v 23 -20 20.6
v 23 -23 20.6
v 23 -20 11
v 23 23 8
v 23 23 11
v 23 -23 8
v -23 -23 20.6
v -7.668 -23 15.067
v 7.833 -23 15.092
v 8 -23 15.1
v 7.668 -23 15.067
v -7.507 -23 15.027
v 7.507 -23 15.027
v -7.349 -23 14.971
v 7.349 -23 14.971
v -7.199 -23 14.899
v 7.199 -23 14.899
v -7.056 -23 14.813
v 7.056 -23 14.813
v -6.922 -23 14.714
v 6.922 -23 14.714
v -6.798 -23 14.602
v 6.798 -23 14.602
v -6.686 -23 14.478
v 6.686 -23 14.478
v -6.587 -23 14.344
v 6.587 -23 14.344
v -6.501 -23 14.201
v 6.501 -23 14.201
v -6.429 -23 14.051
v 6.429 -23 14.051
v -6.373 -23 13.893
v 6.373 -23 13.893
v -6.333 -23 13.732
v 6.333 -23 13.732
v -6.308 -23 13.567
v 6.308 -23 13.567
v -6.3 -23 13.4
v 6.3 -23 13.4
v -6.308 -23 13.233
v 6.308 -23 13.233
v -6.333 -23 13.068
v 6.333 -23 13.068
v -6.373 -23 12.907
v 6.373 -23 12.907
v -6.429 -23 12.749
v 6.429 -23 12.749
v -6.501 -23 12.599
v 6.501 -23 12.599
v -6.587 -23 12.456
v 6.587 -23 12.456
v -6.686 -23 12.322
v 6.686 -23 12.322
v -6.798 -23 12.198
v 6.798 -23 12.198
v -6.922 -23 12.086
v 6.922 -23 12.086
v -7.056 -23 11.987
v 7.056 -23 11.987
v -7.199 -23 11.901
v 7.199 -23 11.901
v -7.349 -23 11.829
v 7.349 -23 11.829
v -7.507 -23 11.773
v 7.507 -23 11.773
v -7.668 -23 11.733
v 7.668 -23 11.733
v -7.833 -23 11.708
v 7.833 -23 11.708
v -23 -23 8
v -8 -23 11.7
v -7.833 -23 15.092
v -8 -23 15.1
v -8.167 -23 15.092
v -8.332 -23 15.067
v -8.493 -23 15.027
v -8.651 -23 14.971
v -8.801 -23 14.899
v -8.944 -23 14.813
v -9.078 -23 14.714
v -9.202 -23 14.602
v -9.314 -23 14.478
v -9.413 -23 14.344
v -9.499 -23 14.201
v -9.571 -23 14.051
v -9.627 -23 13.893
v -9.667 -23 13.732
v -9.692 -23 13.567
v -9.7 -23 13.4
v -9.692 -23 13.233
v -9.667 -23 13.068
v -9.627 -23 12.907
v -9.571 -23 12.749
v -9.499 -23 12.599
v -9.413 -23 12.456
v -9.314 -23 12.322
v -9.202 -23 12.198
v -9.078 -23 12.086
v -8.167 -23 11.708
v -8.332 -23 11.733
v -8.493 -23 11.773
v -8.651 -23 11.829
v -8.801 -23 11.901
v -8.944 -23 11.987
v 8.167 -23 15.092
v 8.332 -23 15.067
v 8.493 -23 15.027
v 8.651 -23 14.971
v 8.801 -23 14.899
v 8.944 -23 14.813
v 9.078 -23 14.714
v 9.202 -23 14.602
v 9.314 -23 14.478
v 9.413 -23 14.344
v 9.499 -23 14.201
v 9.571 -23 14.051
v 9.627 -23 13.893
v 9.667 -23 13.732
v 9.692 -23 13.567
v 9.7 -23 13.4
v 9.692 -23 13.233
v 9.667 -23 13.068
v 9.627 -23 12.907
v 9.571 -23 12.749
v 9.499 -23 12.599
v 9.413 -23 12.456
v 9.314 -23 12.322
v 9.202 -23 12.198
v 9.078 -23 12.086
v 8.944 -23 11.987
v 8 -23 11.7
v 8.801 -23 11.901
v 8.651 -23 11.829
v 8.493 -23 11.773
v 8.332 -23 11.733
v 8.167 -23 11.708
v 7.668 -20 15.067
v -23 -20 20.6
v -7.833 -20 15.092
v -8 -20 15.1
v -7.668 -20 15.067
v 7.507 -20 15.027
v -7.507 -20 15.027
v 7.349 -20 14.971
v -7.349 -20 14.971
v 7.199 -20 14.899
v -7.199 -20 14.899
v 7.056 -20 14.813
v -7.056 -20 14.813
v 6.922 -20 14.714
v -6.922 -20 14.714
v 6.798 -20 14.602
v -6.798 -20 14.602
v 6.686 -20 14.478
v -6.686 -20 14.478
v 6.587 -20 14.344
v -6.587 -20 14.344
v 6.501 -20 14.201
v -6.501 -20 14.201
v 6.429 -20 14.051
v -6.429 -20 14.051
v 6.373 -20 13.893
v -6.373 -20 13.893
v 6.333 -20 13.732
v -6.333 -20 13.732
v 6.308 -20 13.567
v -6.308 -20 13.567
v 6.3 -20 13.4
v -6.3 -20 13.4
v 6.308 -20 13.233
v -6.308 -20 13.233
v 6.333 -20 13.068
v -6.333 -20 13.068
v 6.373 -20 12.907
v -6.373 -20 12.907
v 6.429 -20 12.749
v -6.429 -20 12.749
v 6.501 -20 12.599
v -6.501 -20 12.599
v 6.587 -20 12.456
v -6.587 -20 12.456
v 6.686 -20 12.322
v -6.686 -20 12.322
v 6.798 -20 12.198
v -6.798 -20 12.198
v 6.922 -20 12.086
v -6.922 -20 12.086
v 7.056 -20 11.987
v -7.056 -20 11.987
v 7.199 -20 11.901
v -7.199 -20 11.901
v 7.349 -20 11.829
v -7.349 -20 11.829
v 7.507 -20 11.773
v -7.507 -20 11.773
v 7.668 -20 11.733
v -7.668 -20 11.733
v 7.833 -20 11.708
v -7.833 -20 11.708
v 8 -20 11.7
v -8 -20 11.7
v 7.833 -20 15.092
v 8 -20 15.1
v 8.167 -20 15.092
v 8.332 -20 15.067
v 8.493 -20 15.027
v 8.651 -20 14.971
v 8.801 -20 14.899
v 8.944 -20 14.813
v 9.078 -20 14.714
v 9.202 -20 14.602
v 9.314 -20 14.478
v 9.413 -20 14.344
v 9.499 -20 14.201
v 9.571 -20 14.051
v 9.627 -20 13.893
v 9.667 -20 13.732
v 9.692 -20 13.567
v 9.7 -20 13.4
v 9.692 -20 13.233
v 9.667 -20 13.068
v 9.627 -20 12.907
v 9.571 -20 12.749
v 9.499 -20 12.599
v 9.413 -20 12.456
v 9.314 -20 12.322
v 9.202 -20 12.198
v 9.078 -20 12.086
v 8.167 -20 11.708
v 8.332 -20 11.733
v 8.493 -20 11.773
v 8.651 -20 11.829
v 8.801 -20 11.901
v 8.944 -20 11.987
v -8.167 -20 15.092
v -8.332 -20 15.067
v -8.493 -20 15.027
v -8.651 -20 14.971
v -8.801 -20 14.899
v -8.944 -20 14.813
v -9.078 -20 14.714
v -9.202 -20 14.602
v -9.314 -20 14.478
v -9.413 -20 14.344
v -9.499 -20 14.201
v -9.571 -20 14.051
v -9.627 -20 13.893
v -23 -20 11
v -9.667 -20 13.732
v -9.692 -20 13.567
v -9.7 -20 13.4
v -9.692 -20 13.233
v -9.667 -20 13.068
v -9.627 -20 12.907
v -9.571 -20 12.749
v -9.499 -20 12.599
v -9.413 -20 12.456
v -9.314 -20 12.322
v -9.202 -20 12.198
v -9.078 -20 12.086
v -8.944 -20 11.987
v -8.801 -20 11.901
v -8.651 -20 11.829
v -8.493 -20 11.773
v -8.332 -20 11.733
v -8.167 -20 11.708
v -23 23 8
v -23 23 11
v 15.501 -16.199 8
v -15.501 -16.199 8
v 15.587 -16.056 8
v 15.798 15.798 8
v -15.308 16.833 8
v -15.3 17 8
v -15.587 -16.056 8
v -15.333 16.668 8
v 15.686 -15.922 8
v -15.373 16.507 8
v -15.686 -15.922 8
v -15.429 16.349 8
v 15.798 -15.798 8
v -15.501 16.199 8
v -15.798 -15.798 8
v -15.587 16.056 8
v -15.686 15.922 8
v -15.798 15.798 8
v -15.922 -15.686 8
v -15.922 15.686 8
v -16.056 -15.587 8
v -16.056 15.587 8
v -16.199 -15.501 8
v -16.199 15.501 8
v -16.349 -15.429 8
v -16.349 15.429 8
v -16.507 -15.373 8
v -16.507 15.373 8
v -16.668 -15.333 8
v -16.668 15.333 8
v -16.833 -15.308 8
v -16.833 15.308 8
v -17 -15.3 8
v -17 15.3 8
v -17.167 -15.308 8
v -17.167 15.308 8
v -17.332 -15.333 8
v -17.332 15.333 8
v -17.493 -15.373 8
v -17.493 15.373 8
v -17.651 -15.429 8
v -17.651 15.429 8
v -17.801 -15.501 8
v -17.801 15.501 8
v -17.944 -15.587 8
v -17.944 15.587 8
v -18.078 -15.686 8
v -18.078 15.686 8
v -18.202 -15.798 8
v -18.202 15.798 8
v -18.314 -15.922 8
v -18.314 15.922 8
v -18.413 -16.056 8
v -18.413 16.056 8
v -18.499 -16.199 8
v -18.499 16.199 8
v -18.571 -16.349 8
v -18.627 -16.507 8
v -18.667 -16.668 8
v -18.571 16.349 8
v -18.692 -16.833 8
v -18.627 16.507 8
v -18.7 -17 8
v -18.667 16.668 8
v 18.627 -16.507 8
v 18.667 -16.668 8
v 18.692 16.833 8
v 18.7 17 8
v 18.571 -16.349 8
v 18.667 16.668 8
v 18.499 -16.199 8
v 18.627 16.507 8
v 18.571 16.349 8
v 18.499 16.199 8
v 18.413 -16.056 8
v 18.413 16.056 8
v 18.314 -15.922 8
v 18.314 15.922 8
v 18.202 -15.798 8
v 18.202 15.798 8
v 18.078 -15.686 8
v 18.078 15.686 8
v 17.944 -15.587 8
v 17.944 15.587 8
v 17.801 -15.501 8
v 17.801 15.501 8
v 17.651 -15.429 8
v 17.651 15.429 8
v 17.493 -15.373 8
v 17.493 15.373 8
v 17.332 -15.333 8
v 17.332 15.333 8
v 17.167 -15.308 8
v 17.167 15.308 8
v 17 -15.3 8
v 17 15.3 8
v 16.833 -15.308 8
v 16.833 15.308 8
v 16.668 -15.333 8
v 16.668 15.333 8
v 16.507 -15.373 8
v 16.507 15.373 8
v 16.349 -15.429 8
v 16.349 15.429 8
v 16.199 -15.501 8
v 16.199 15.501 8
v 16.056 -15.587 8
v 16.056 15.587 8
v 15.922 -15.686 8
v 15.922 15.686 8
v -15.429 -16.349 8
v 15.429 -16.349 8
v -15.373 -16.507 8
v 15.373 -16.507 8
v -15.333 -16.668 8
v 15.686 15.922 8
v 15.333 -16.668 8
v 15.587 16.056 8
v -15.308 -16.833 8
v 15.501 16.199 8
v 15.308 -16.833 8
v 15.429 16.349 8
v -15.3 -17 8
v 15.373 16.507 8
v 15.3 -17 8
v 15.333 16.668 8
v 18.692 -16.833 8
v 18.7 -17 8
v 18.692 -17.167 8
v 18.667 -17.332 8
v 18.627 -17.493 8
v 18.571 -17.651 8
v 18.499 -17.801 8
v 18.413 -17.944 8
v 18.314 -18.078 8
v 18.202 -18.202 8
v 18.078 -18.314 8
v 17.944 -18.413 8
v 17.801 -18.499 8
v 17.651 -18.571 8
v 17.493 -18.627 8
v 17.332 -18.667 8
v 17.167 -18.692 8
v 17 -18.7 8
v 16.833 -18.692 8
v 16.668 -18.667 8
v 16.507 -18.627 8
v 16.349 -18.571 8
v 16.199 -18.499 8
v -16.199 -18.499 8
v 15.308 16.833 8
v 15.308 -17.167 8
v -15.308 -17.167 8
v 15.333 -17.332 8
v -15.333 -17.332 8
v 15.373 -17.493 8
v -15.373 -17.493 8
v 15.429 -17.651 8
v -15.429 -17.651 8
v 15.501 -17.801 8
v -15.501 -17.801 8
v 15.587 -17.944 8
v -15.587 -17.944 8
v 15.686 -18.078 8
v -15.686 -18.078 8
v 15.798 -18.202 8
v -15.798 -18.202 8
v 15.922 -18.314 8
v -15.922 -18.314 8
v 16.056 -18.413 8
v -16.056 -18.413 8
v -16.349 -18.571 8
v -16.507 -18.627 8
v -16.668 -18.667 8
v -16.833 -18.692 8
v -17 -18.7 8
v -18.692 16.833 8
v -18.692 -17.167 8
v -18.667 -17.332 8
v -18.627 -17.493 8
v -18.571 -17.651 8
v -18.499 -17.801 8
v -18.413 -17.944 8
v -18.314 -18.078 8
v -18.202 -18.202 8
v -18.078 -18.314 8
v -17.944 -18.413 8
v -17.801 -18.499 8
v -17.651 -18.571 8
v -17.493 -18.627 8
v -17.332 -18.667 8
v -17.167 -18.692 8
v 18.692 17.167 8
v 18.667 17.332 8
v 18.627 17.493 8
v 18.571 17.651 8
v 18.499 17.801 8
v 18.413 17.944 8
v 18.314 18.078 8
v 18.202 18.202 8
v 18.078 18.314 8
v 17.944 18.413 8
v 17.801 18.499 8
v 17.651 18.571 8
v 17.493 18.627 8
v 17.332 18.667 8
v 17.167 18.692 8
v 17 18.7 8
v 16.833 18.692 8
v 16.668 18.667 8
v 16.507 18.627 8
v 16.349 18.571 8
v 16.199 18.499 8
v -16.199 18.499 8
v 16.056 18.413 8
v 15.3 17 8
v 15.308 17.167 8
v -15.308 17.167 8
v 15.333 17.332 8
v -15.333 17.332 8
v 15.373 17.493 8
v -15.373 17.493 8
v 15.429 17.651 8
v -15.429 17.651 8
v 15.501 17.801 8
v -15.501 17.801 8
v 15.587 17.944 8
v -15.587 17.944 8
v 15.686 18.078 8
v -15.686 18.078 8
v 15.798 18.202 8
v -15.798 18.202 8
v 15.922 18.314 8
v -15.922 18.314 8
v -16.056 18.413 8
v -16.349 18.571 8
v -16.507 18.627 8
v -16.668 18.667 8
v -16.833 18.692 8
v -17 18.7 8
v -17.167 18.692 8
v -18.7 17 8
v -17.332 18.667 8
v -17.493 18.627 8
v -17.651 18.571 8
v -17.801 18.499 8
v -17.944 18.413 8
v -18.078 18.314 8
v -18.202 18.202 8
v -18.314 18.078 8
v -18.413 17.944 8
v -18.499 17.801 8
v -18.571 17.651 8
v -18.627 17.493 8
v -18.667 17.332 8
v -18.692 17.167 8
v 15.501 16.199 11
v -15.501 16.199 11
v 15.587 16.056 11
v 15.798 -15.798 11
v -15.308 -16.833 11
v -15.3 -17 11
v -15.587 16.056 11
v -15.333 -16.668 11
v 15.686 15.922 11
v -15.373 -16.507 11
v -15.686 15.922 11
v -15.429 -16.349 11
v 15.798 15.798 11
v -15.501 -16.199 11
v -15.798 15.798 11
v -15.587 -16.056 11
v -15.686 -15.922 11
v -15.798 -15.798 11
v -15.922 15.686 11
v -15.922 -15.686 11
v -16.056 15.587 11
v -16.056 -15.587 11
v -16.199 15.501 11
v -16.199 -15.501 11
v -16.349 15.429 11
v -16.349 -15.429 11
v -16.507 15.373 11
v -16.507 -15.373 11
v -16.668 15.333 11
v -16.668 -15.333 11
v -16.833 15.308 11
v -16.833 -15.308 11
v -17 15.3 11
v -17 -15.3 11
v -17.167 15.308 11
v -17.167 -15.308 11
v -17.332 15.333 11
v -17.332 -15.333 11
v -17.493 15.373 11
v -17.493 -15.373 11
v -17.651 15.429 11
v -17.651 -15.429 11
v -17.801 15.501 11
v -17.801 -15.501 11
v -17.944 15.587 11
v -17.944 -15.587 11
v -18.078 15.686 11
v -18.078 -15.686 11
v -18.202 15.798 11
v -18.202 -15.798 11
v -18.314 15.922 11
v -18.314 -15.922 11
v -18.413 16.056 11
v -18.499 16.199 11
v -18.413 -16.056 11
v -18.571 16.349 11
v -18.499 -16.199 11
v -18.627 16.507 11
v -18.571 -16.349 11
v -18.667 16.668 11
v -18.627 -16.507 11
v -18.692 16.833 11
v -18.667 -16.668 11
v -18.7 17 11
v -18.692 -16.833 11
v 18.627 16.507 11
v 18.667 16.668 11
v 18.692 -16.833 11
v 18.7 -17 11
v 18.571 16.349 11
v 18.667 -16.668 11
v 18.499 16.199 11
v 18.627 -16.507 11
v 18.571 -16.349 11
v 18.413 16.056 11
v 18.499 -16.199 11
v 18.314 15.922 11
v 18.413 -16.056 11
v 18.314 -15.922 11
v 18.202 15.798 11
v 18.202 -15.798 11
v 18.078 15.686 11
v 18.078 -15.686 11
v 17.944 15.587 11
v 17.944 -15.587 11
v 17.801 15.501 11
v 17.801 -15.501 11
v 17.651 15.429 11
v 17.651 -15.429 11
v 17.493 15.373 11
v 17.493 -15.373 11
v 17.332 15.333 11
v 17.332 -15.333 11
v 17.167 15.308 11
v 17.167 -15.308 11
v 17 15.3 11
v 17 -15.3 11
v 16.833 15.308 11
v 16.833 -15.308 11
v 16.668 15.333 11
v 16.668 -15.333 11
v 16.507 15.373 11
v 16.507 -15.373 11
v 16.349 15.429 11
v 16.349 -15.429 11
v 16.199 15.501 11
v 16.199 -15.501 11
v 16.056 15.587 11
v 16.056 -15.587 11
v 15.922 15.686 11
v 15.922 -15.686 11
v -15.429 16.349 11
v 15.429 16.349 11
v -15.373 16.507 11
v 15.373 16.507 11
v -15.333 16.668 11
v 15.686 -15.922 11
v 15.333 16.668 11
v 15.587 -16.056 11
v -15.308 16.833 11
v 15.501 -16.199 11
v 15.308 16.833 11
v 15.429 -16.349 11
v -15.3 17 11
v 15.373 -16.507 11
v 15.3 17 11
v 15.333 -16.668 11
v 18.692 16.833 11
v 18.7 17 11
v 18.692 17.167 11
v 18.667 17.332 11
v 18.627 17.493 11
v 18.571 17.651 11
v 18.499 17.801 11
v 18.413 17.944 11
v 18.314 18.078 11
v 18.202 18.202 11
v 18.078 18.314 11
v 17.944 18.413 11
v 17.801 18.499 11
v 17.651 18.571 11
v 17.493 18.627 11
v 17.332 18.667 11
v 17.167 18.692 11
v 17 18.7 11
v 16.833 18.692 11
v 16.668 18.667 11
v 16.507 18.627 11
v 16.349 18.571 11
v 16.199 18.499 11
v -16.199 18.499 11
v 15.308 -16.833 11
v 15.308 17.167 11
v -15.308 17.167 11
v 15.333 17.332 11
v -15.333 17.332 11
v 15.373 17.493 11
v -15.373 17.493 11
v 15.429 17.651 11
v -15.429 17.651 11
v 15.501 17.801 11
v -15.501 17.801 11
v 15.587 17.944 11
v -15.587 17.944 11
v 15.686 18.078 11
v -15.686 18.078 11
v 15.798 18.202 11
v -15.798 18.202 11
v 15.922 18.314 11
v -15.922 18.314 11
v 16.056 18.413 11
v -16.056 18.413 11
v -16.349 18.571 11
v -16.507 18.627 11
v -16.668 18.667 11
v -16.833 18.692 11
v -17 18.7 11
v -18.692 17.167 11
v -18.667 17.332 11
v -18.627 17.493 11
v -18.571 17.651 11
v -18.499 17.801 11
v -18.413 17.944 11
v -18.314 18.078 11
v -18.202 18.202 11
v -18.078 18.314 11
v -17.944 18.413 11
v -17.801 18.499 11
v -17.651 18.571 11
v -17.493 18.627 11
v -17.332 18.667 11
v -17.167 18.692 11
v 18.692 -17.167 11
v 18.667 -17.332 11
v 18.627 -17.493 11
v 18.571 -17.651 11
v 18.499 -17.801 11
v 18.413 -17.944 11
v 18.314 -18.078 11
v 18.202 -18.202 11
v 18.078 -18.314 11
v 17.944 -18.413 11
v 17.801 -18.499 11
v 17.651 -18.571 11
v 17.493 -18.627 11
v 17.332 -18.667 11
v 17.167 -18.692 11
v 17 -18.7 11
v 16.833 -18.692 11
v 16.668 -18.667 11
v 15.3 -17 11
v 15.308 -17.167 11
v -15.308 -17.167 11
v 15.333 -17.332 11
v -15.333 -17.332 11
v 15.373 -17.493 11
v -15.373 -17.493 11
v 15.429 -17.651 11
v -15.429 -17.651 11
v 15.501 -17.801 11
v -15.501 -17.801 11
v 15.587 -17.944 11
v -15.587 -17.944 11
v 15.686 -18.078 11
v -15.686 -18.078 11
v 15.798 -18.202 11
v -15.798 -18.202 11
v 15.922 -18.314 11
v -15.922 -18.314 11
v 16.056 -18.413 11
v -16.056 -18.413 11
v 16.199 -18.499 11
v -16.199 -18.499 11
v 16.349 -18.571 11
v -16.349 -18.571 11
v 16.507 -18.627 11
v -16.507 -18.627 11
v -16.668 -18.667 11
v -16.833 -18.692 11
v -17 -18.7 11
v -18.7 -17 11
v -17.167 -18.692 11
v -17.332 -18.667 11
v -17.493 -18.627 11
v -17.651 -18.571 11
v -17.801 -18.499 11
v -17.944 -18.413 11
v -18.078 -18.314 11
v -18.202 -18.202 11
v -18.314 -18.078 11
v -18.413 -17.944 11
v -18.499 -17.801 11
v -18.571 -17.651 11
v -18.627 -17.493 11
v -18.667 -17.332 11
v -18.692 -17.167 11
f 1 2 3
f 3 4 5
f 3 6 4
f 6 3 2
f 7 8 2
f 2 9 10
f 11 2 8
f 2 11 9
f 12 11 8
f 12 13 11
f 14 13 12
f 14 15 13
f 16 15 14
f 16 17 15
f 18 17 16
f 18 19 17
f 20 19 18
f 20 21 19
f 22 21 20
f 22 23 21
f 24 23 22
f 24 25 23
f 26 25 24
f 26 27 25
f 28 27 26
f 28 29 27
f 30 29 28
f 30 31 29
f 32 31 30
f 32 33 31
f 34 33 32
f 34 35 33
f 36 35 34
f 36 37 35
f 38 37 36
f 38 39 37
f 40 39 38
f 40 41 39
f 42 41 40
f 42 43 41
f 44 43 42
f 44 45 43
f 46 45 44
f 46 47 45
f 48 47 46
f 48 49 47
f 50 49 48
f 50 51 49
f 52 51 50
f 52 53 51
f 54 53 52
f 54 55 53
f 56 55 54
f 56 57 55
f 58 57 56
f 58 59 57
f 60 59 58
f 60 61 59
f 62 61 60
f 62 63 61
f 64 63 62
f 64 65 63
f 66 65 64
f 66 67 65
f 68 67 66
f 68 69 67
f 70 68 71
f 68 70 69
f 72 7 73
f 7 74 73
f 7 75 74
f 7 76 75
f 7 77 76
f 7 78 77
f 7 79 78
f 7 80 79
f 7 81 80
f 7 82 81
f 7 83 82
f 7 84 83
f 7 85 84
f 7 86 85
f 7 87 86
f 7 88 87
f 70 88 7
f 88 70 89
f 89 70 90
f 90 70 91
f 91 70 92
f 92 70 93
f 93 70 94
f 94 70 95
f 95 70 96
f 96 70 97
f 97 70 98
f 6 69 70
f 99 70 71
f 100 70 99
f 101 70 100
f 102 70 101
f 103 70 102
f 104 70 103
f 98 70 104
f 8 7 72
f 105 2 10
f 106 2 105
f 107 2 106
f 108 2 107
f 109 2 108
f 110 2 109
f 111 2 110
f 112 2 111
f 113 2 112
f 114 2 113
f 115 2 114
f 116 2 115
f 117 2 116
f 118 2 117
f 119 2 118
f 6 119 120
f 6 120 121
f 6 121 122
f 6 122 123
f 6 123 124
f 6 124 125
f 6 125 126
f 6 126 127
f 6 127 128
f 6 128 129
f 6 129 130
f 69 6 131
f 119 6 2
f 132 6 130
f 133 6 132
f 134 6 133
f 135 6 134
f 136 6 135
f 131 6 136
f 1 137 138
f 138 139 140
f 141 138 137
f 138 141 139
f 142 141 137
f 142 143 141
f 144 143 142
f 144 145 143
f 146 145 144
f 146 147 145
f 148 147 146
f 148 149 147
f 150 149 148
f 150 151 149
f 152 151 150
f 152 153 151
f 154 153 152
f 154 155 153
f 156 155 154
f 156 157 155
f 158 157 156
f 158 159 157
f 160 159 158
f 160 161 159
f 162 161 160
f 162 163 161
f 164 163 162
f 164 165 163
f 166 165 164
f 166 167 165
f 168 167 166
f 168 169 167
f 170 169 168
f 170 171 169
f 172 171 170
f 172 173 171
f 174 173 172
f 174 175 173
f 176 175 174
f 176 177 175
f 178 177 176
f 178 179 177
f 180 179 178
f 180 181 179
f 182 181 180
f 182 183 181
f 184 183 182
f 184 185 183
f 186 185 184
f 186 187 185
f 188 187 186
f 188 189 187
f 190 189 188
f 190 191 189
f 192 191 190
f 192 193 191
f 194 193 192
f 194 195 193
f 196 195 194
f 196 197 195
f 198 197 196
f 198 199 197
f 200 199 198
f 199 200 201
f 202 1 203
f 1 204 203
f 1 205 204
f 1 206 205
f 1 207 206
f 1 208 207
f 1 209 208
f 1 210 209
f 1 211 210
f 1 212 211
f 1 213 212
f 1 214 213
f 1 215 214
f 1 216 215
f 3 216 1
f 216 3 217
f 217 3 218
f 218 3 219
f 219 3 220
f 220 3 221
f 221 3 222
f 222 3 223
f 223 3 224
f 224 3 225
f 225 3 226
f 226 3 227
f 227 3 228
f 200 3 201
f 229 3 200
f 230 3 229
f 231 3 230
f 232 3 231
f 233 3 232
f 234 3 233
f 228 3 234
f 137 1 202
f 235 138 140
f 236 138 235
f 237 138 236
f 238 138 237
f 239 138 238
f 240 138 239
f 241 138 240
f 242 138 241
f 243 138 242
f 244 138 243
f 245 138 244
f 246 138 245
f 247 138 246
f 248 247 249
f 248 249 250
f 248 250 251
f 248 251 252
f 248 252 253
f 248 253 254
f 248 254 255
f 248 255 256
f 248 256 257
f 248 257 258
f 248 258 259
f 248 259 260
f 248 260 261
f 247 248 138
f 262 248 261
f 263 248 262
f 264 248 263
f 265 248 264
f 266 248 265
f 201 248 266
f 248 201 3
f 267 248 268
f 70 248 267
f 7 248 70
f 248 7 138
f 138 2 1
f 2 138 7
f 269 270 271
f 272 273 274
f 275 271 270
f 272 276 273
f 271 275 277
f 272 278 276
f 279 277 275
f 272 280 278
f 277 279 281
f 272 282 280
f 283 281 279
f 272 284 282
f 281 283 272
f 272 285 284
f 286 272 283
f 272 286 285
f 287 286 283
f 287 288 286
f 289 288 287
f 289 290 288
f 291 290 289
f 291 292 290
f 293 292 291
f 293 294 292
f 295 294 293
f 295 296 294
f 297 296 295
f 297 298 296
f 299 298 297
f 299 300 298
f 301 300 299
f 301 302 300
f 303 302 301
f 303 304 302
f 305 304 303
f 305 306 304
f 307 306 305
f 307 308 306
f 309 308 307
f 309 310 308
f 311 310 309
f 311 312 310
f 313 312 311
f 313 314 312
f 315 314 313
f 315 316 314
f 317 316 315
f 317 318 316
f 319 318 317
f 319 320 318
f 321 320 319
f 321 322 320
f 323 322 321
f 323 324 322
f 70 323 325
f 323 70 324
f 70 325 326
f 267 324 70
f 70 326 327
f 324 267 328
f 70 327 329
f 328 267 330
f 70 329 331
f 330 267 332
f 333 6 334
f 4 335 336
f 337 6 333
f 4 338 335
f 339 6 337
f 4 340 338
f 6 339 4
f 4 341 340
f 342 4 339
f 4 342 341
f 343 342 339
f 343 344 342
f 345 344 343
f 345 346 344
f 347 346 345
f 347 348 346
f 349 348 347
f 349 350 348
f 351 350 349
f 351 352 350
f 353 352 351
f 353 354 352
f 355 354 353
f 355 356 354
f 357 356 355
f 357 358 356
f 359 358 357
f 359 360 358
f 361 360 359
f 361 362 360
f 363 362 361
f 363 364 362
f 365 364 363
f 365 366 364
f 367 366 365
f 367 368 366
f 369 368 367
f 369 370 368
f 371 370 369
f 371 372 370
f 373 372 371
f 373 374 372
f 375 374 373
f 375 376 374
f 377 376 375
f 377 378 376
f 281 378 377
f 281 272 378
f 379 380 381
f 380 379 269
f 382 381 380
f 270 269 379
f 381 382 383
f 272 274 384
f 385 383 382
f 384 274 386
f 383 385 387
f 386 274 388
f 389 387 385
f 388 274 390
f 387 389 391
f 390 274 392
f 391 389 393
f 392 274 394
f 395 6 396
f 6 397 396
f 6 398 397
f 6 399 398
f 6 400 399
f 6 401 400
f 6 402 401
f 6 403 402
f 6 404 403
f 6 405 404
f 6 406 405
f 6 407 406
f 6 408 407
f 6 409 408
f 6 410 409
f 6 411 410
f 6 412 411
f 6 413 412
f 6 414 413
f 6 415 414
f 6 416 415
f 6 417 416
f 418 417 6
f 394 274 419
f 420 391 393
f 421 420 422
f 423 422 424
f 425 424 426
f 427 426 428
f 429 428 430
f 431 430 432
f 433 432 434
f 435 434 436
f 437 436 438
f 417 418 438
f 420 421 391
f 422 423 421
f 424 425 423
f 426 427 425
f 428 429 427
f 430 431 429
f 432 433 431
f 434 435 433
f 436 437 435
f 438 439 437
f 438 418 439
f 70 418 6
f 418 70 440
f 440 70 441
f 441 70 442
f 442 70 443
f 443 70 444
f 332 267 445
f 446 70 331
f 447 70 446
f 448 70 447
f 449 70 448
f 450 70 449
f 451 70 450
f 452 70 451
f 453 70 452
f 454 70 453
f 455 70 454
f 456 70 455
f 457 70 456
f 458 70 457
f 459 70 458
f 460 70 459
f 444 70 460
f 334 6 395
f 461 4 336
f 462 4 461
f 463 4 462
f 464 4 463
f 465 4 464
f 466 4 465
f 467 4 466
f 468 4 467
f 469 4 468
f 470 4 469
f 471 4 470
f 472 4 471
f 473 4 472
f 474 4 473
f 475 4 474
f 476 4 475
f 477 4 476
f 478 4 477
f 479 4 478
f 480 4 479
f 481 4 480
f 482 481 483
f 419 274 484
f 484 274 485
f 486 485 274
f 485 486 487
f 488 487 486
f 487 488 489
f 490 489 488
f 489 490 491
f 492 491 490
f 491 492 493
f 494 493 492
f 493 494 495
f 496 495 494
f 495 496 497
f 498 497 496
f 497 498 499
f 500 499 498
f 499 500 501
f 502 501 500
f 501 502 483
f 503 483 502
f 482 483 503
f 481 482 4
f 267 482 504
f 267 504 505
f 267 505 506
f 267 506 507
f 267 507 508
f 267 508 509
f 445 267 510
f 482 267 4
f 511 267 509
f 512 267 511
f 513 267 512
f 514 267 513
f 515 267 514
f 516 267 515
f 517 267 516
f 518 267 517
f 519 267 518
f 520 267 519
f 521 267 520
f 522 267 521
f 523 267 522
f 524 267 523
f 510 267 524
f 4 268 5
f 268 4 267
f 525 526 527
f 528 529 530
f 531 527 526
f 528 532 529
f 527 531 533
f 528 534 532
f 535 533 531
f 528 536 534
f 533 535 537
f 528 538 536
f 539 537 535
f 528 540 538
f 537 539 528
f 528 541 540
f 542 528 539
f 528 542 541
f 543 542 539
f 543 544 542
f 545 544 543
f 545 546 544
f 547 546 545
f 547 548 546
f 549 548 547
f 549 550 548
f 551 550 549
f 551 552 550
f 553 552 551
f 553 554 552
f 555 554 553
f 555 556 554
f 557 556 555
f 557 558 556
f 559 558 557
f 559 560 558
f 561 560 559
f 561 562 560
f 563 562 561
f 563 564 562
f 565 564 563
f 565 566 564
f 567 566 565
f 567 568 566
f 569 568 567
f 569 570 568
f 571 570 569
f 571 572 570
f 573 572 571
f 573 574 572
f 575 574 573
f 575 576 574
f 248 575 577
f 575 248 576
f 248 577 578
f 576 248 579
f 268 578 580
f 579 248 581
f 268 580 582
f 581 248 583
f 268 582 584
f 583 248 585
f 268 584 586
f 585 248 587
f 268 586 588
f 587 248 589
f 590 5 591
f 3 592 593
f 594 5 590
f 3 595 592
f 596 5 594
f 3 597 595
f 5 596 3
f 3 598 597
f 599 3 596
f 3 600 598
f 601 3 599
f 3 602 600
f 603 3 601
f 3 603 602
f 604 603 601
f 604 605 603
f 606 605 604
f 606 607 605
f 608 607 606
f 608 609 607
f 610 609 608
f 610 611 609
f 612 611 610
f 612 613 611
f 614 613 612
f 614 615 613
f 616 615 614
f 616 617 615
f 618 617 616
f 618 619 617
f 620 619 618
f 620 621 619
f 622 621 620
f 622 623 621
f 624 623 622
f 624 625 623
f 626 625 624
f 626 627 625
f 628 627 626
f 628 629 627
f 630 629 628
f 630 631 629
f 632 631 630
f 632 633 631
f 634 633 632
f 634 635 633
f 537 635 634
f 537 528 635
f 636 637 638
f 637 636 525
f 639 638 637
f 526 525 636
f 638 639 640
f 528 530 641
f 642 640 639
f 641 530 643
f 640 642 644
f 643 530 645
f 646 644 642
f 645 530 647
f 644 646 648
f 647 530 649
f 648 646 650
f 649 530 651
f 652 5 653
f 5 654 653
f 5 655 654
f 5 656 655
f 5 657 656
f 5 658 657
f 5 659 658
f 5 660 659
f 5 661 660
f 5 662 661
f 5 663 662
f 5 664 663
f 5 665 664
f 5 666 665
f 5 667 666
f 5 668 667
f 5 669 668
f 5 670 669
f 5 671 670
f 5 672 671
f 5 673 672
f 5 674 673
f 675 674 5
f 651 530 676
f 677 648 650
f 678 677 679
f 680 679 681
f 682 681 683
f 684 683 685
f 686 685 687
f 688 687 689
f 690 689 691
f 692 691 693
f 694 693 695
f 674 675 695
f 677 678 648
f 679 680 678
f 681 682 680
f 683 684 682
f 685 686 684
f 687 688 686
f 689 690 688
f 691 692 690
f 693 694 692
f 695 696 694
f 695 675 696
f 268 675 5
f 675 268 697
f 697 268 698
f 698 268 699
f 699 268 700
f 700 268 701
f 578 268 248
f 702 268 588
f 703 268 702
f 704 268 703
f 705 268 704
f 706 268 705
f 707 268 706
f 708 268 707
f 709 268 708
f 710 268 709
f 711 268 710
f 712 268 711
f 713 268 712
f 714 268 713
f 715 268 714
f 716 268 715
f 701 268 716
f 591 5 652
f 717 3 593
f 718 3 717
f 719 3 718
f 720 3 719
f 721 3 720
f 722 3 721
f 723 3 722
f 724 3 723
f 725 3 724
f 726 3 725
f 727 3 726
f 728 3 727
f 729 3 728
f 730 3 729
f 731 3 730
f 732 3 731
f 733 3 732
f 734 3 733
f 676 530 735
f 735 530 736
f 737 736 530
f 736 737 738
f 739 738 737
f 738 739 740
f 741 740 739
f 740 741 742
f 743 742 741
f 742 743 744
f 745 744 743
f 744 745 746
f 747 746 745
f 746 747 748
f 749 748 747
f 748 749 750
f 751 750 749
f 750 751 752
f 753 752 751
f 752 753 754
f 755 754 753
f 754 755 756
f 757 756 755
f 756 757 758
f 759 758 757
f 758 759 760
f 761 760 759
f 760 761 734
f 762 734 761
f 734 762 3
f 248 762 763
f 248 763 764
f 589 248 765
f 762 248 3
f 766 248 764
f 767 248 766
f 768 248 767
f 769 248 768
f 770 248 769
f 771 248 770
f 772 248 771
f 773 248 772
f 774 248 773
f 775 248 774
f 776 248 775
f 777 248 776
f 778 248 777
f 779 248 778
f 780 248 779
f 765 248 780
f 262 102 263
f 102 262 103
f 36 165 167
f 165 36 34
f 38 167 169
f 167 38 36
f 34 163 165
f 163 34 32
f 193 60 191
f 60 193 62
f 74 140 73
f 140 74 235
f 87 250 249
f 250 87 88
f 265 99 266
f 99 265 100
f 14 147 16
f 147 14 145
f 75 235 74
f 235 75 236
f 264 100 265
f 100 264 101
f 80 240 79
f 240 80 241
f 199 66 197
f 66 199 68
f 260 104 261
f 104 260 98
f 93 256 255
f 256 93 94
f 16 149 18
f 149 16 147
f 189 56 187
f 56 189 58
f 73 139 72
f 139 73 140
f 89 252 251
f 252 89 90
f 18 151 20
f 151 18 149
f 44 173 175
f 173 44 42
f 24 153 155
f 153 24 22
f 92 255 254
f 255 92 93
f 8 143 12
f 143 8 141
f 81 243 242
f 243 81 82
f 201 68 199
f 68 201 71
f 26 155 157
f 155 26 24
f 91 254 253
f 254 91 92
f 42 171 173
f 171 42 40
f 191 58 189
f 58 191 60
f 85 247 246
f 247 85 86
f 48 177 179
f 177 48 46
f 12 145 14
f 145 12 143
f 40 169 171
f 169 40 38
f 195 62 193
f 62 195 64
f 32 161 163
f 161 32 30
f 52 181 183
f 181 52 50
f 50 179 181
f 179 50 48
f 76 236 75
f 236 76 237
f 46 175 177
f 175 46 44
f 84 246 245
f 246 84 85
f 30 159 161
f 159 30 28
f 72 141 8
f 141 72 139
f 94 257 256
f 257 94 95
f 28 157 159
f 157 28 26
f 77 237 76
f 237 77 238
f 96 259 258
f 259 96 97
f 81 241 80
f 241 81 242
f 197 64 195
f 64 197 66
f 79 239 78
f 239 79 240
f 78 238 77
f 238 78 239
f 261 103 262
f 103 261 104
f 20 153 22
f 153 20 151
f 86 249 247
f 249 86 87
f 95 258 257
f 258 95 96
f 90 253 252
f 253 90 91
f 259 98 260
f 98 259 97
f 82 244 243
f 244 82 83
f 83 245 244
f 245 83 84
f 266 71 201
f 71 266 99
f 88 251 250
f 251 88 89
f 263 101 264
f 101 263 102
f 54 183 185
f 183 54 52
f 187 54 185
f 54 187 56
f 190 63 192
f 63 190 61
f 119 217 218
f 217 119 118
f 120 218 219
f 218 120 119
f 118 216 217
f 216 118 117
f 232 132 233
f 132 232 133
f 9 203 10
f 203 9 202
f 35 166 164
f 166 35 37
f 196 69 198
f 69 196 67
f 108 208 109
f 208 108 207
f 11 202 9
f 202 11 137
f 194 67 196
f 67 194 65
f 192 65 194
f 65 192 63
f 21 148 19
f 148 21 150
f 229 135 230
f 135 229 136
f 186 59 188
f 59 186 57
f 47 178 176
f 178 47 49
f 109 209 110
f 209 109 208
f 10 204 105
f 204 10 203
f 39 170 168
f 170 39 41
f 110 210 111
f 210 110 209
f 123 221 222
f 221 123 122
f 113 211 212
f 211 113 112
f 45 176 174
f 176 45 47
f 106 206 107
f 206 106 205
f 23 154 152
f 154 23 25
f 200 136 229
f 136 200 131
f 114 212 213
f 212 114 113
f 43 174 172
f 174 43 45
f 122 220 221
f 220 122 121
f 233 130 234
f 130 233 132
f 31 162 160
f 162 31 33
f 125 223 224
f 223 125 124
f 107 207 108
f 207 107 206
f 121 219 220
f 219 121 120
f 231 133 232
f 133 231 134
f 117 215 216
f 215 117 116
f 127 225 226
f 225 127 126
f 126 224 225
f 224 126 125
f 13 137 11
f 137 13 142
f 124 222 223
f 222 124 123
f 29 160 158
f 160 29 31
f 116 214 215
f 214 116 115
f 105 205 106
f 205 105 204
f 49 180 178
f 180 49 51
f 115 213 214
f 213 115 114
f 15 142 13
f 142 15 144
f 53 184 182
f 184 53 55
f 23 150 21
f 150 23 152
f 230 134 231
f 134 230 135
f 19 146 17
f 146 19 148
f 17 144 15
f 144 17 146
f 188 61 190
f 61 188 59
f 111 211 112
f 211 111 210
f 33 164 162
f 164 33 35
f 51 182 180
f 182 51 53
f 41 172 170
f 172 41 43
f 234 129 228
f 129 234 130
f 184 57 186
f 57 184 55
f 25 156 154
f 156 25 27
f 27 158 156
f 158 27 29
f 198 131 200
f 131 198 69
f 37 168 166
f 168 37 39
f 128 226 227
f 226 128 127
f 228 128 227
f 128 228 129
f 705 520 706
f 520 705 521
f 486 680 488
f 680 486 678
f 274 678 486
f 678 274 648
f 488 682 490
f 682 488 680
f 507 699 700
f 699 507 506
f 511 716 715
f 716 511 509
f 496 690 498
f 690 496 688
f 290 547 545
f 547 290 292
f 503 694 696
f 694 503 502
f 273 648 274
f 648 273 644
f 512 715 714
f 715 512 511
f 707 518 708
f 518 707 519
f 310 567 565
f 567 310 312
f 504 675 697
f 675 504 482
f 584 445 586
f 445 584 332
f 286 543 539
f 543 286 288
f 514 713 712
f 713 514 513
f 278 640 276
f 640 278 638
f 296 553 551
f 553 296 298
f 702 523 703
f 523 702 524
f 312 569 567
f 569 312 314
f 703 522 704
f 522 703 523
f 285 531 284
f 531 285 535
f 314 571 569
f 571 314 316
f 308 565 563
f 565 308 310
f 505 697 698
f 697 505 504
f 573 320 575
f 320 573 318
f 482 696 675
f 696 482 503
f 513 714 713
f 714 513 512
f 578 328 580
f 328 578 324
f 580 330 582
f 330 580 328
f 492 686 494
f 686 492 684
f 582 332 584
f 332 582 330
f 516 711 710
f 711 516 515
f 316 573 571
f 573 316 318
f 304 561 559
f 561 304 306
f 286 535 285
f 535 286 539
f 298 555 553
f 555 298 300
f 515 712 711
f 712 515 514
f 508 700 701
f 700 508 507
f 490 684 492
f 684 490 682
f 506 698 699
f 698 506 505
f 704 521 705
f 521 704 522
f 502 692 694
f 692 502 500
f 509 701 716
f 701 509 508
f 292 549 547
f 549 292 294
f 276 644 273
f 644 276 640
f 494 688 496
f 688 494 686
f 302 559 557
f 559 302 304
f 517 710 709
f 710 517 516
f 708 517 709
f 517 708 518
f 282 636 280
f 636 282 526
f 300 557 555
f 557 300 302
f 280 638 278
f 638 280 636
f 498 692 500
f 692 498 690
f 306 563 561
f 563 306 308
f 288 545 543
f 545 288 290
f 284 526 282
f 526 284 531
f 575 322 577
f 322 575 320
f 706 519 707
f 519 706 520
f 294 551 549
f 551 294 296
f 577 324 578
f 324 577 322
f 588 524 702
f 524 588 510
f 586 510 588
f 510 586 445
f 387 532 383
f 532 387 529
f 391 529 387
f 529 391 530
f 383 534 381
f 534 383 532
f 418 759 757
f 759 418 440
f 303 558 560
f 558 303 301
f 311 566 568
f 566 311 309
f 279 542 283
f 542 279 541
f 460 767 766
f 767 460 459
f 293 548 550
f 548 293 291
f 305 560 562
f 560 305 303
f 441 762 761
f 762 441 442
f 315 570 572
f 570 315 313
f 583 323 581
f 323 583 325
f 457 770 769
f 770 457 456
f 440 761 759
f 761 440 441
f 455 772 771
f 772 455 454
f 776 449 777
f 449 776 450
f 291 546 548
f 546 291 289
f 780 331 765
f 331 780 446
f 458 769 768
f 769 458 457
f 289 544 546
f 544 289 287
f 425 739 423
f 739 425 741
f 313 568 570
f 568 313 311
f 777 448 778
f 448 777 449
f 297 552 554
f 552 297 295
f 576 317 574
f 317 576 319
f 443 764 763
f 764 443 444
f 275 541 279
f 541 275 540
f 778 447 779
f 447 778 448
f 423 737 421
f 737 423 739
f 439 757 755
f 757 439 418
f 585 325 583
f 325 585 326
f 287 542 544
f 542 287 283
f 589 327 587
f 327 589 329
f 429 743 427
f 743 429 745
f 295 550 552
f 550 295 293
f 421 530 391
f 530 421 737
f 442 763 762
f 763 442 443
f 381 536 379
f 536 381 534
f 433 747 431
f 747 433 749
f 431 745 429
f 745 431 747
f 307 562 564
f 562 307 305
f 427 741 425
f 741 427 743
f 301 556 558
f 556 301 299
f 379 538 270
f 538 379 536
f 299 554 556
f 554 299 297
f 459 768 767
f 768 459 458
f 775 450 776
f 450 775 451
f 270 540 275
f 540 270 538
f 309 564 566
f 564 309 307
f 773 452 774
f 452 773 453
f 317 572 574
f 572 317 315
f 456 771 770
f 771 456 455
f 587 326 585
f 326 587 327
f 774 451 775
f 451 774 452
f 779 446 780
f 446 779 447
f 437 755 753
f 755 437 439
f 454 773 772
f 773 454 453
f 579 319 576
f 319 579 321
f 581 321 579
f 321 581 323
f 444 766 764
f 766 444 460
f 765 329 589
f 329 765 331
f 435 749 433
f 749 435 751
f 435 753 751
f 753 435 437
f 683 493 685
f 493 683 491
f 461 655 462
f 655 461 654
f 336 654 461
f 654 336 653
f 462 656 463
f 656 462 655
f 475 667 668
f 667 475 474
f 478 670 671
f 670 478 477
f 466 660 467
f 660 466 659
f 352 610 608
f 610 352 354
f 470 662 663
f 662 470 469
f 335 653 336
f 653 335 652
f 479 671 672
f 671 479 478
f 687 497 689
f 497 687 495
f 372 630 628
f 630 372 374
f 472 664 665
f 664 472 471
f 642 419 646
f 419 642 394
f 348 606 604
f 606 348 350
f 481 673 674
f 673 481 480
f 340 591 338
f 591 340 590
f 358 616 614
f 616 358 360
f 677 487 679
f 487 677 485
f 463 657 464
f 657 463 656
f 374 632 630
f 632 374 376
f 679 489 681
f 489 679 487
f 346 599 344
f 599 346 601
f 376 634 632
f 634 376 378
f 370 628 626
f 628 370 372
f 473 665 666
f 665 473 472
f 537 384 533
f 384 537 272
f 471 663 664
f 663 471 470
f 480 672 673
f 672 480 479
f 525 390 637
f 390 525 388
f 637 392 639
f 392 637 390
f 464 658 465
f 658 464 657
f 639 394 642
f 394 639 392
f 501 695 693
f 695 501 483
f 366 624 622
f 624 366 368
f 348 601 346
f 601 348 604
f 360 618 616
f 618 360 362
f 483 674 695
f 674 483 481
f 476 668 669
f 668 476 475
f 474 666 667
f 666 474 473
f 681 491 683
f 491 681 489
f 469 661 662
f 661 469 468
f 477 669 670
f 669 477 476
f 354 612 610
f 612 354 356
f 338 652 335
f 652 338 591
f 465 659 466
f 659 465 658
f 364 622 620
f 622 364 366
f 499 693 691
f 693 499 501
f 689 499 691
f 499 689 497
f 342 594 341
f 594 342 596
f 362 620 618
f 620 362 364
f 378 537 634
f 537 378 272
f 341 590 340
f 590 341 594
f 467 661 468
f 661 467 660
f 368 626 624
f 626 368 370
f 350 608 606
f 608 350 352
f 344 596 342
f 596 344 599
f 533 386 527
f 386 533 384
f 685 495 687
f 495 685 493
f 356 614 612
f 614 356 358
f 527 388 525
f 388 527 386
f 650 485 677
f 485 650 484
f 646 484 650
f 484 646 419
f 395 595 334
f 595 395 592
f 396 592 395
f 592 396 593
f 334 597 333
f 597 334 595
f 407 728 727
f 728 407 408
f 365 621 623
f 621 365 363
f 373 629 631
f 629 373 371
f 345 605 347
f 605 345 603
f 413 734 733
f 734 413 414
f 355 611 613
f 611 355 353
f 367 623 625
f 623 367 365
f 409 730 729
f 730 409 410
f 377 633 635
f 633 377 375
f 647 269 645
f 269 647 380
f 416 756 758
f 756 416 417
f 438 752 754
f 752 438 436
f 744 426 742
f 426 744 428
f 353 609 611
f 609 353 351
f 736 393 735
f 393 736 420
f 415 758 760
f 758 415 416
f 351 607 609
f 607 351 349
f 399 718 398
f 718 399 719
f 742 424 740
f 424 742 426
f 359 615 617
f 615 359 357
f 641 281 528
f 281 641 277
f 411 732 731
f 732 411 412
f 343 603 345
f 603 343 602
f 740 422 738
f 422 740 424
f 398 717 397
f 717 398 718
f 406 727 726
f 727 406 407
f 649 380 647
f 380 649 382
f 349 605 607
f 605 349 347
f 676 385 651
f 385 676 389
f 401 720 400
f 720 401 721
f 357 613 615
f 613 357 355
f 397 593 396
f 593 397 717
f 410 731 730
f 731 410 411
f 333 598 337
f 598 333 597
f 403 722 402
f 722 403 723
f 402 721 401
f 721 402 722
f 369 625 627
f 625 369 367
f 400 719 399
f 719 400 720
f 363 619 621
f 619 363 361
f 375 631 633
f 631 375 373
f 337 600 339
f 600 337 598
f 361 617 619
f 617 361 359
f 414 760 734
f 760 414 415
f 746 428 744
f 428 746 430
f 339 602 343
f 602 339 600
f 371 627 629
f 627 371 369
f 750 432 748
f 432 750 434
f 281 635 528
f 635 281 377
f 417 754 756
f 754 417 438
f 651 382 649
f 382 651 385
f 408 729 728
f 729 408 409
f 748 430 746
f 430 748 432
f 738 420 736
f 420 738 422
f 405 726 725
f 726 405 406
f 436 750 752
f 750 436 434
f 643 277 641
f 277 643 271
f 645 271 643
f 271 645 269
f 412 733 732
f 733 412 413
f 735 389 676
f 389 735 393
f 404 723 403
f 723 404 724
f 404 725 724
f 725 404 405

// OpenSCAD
// Standalone ankle PCB L-bracket for the 42 mm AS5047P module.
// v5.2 FIX: the aft bar end and the screw row were hardcoded absolutes
//   left over from before the v5.4 +8 mm standoff; the bar had collapsed
//   12.6 -> 4.6 mm and the M3 clearance hole broke out of the bar's rear
//   edge (and pierced the plate, blocking the driver). Both are now
//   derived from the plate front plane in frame_master.scad.
// (Coupang 하이제니스, magnet included, side SMT 6-pin SPI socket).
// Vertical plate (46 wide) backs the full board and takes FOUR M3
// self-taps on the 37 mm corner grid (pilot 2.7, (*) measure on
// arrival). The top bar starts at the plate front plane and runs aft
// under the carrier bridge - M3 CLEARANCE (3.4) through-holes in the
// bar, self-tap PILOTS (2.7) in the bridge, screw row behind the plate
// so the driver has a straight shot from below. The board's SMT
// connector exits -X sideways through the open carrier center.
// Print orientation (set in frame_v5): plate flat on the bed, bar as a
// vertical wall - no supports.
// Assembly: screw the PCB to the plate FIRST, then bolt the bar to the
// bridge from the open center of the carrier.
// Edit shared dimensions in frame_v5.scad so everything stays linked.

part_mode = "ankle_pcb_bracket";
print_export = true;

include <frame_master.scad>
